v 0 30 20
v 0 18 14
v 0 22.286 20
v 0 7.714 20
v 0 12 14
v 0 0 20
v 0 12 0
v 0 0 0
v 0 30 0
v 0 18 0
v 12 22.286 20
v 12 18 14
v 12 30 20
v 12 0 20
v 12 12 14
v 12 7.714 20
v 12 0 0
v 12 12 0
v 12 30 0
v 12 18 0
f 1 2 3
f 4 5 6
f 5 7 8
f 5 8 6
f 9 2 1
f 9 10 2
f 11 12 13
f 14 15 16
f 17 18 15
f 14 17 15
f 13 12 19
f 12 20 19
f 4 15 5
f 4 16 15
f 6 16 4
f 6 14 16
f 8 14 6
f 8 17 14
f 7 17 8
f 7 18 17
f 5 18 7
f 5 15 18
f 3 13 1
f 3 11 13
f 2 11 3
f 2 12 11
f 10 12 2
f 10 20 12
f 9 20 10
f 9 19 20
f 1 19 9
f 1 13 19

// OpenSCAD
// Countersink: a conical, angled recess (90deg included) over a narrower
// through-hole, for a flat/countersunk screw head.
// Modeled as an extruded cross-section profile (viewed face-on from the
// renderer's "side" view) so the taper is unambiguous — a solid CSG hole
// would be hidden inside an opaque block from any outside view.
w = 30; h = 20; thick = 12;
csk_top_r = 8; csk_d = 6;
hole_r = 3;

rotate([0, 0, 90])
rotate([90, 0, 0])
linear_extrude(height = thick)
difference() {
    square([w, h]);
    polygon(points = [
        [w / 2 - hole_r, -1],
        [w / 2 - hole_r, h - csk_d],
        [w / 2 - csk_top_r, h + 1],
        [w / 2 + csk_top_r, h + 1],
        [w / 2 + hole_r, h - csk_d],
        [w / 2 + hole_r, -1],
    ]);
}
